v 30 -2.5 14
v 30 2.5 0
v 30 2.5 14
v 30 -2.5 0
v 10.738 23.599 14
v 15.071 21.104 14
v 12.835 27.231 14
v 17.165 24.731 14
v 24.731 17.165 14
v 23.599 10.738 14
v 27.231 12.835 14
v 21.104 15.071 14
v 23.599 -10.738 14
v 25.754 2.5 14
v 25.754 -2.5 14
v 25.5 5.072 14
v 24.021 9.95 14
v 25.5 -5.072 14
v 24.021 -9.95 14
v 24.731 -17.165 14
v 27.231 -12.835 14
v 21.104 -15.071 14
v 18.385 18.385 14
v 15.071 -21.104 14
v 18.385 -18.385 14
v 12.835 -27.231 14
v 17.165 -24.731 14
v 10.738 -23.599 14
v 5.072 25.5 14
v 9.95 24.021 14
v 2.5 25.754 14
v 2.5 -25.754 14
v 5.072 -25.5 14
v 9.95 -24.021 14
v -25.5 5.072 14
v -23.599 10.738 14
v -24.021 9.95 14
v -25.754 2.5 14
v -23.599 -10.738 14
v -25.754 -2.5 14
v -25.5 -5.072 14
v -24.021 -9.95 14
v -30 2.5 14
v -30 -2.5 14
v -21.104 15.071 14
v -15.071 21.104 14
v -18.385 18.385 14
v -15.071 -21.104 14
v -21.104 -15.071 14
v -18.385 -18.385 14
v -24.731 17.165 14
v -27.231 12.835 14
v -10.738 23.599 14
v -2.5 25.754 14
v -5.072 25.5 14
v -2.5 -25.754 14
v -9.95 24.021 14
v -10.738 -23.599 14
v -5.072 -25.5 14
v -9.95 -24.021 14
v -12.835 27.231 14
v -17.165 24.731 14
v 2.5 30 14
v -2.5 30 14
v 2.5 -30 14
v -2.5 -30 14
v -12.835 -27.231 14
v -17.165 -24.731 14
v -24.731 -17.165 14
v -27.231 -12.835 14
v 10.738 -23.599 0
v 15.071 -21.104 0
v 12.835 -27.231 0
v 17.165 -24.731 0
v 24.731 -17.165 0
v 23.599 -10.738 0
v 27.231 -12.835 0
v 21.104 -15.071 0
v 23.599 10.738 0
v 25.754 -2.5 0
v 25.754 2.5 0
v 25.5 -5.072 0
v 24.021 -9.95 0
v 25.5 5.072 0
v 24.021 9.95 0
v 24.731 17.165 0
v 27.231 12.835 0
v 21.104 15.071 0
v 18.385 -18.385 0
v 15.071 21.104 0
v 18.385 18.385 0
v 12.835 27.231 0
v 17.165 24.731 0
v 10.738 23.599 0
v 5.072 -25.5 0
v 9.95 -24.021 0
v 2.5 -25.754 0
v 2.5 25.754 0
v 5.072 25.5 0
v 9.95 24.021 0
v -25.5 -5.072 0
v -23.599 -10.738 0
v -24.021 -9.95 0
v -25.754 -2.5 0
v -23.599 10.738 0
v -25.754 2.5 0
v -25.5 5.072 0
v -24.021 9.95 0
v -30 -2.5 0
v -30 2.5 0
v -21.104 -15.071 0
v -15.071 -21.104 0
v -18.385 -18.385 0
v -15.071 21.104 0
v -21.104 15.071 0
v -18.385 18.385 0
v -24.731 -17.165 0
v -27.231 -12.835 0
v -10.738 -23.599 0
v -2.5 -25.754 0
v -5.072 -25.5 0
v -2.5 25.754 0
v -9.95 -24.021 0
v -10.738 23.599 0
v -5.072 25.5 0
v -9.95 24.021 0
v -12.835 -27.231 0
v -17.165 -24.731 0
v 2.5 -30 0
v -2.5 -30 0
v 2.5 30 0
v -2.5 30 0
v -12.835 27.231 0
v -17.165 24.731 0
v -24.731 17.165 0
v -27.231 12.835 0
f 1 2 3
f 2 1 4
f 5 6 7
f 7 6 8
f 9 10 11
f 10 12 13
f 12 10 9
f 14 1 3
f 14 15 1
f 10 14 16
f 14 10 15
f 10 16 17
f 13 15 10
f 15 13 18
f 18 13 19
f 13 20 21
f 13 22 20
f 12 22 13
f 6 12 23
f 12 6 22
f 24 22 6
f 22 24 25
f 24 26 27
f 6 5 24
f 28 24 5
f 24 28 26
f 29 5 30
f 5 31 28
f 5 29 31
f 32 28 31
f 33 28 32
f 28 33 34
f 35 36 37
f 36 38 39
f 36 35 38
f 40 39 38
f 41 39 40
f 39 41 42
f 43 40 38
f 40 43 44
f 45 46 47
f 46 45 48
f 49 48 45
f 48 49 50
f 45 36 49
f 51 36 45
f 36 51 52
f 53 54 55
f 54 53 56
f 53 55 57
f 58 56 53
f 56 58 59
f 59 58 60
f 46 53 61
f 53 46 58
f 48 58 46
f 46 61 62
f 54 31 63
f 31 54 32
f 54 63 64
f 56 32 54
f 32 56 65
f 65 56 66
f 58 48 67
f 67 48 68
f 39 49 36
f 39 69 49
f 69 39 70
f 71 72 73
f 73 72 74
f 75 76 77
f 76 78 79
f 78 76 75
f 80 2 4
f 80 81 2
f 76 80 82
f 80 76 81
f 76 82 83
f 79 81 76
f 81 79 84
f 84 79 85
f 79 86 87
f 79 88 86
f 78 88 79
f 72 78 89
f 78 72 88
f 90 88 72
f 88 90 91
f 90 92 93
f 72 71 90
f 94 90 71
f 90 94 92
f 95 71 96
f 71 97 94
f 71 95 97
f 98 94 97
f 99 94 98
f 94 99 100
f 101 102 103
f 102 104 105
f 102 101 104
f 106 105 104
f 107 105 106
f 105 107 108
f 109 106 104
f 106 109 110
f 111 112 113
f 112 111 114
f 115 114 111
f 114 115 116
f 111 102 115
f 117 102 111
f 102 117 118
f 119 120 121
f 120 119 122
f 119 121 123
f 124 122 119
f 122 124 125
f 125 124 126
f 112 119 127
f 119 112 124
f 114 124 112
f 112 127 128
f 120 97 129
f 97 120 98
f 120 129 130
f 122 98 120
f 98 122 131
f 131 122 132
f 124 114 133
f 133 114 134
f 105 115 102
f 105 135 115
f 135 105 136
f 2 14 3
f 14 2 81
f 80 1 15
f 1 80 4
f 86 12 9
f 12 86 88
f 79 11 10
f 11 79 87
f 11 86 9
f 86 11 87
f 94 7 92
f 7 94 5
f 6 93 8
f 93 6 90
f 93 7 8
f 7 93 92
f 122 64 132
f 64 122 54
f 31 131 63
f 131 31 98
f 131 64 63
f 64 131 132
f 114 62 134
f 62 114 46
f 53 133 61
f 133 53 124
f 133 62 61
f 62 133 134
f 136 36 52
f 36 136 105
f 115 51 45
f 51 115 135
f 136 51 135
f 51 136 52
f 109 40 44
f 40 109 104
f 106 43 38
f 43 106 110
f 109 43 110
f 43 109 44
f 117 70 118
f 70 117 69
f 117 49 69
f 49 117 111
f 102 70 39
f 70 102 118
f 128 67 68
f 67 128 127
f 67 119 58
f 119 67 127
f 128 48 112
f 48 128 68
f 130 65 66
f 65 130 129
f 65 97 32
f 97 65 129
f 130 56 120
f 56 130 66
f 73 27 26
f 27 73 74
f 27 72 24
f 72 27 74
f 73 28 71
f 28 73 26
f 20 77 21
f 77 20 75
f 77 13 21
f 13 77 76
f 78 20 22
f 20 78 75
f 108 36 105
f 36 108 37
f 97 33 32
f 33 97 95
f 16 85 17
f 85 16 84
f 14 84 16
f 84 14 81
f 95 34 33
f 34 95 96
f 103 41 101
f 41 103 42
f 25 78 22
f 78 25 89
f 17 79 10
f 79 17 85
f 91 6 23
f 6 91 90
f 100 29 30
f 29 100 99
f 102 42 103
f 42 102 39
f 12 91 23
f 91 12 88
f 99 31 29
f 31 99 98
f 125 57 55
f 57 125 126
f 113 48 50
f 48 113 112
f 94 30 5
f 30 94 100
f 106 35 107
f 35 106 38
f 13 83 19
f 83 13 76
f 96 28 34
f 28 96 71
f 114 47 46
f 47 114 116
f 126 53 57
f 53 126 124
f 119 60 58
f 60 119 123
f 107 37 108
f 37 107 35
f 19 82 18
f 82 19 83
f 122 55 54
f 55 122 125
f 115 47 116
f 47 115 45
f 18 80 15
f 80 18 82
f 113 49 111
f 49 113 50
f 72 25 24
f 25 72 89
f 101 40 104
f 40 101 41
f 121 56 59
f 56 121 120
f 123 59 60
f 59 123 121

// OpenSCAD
$fn = 32;

// ----------------------------------------------------------------------
// Spur blank: plain gear blank
// ----------------------------------------------------------------------

// --- parameters (mm) ---
disc_r = 26;              // blank root radius
disc_t = 14;              // blank thickness
n_teeth = 12;             // stub tooth count
tooth_w = 5;              // tooth width at the root
tooth_h = 4;              // tooth height above the root

out_r = disc_r + tooth_h;  // tip radius
bbox_x = 60.0;  // measured width over the teeth
bbox_y = 60.0;  // measured depth over the teeth

union() {
  cylinder(r = disc_r, h = disc_t);
  for (i = [0 : n_teeth - 1])
    rotate([0, 0, i * 360 / n_teeth])
      translate([disc_r - 1, -tooth_w / 2, 0])
        cube([tooth_h + 1, tooth_w, disc_t]);
}
